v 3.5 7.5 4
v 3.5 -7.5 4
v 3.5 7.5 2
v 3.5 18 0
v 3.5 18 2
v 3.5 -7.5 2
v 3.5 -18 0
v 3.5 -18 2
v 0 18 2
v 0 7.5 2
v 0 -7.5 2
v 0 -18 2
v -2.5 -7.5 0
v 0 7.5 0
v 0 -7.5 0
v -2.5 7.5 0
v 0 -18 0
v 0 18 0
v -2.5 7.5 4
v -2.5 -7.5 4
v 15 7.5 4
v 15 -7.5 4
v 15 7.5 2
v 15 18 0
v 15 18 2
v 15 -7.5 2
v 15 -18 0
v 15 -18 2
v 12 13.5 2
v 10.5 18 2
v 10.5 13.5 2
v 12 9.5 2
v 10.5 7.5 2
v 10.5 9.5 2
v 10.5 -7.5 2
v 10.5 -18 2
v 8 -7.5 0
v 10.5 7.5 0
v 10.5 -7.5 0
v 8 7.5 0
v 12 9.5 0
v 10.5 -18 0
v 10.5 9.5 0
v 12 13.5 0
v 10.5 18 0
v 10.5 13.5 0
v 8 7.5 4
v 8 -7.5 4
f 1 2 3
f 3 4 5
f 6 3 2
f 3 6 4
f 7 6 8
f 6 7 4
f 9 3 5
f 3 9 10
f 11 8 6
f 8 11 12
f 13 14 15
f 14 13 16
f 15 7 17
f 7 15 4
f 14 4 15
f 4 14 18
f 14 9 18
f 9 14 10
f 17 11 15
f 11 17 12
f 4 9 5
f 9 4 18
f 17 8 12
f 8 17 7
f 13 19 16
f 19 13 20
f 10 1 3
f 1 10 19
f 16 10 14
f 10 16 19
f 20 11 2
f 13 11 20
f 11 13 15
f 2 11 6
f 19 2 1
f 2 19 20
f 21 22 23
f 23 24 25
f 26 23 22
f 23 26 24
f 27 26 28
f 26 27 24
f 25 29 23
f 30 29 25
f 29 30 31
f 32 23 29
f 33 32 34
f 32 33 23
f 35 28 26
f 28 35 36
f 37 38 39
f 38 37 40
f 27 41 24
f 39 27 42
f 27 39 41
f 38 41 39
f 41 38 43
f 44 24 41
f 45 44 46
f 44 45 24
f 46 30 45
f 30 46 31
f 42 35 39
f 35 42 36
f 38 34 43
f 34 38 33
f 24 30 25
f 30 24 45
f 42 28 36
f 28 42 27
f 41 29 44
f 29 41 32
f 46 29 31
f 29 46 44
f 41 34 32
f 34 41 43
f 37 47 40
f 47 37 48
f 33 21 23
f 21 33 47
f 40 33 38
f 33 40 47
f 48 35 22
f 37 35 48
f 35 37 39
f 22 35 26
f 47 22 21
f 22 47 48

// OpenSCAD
$fn=50;

ts=2;
a1=36;
a2=30;
fp=2.5;
hz=3.5;
dd=[8.5,4];


all1();//для части без разъема
translate([hz*3,0,0])all2(hz+1);//для части с разъемом

module all(){

    translate([hz/2,0,ts/2])cube([hz,a1,ts],true);
    translate([-fp/2,0,ts/2])cube([fp,a2,ts],true);
    translate([(fp+hz)/2-fp,0,ts])cube([fp+hz,a2/2,2*ts],true);

}

module all1(){
    difference(){
        translate([hz/2,0,ts/2])cube([hz,a1,ts],true);
       // translate([0,a1/2-dd.x+dd.y/2,ts/2])cube([hz/3,dd.y,ts*2],true);
    }
    
    translate([-fp/2,0,ts/2])cube([fp,a2/2,ts],true);
    translate([(fp+hz)/2-fp,0,ts])cube([fp+hz,a2/2,2*ts],true);

}
module all2(hz){
    difference(){
        translate([hz/2,0,ts/2])cube([hz,a1,ts],true);
        translate([0,a1/2-dd.x+dd.y/2,ts/2])cube([hz/1.5,dd.y,ts*2],true);
    }
    
    translate([-fp/2,0,ts/2])cube([fp,a2/2,ts],true);
    translate([(fp+hz)/2-fp,0,ts])cube([fp+hz,a2/2,2*ts],true);

}
